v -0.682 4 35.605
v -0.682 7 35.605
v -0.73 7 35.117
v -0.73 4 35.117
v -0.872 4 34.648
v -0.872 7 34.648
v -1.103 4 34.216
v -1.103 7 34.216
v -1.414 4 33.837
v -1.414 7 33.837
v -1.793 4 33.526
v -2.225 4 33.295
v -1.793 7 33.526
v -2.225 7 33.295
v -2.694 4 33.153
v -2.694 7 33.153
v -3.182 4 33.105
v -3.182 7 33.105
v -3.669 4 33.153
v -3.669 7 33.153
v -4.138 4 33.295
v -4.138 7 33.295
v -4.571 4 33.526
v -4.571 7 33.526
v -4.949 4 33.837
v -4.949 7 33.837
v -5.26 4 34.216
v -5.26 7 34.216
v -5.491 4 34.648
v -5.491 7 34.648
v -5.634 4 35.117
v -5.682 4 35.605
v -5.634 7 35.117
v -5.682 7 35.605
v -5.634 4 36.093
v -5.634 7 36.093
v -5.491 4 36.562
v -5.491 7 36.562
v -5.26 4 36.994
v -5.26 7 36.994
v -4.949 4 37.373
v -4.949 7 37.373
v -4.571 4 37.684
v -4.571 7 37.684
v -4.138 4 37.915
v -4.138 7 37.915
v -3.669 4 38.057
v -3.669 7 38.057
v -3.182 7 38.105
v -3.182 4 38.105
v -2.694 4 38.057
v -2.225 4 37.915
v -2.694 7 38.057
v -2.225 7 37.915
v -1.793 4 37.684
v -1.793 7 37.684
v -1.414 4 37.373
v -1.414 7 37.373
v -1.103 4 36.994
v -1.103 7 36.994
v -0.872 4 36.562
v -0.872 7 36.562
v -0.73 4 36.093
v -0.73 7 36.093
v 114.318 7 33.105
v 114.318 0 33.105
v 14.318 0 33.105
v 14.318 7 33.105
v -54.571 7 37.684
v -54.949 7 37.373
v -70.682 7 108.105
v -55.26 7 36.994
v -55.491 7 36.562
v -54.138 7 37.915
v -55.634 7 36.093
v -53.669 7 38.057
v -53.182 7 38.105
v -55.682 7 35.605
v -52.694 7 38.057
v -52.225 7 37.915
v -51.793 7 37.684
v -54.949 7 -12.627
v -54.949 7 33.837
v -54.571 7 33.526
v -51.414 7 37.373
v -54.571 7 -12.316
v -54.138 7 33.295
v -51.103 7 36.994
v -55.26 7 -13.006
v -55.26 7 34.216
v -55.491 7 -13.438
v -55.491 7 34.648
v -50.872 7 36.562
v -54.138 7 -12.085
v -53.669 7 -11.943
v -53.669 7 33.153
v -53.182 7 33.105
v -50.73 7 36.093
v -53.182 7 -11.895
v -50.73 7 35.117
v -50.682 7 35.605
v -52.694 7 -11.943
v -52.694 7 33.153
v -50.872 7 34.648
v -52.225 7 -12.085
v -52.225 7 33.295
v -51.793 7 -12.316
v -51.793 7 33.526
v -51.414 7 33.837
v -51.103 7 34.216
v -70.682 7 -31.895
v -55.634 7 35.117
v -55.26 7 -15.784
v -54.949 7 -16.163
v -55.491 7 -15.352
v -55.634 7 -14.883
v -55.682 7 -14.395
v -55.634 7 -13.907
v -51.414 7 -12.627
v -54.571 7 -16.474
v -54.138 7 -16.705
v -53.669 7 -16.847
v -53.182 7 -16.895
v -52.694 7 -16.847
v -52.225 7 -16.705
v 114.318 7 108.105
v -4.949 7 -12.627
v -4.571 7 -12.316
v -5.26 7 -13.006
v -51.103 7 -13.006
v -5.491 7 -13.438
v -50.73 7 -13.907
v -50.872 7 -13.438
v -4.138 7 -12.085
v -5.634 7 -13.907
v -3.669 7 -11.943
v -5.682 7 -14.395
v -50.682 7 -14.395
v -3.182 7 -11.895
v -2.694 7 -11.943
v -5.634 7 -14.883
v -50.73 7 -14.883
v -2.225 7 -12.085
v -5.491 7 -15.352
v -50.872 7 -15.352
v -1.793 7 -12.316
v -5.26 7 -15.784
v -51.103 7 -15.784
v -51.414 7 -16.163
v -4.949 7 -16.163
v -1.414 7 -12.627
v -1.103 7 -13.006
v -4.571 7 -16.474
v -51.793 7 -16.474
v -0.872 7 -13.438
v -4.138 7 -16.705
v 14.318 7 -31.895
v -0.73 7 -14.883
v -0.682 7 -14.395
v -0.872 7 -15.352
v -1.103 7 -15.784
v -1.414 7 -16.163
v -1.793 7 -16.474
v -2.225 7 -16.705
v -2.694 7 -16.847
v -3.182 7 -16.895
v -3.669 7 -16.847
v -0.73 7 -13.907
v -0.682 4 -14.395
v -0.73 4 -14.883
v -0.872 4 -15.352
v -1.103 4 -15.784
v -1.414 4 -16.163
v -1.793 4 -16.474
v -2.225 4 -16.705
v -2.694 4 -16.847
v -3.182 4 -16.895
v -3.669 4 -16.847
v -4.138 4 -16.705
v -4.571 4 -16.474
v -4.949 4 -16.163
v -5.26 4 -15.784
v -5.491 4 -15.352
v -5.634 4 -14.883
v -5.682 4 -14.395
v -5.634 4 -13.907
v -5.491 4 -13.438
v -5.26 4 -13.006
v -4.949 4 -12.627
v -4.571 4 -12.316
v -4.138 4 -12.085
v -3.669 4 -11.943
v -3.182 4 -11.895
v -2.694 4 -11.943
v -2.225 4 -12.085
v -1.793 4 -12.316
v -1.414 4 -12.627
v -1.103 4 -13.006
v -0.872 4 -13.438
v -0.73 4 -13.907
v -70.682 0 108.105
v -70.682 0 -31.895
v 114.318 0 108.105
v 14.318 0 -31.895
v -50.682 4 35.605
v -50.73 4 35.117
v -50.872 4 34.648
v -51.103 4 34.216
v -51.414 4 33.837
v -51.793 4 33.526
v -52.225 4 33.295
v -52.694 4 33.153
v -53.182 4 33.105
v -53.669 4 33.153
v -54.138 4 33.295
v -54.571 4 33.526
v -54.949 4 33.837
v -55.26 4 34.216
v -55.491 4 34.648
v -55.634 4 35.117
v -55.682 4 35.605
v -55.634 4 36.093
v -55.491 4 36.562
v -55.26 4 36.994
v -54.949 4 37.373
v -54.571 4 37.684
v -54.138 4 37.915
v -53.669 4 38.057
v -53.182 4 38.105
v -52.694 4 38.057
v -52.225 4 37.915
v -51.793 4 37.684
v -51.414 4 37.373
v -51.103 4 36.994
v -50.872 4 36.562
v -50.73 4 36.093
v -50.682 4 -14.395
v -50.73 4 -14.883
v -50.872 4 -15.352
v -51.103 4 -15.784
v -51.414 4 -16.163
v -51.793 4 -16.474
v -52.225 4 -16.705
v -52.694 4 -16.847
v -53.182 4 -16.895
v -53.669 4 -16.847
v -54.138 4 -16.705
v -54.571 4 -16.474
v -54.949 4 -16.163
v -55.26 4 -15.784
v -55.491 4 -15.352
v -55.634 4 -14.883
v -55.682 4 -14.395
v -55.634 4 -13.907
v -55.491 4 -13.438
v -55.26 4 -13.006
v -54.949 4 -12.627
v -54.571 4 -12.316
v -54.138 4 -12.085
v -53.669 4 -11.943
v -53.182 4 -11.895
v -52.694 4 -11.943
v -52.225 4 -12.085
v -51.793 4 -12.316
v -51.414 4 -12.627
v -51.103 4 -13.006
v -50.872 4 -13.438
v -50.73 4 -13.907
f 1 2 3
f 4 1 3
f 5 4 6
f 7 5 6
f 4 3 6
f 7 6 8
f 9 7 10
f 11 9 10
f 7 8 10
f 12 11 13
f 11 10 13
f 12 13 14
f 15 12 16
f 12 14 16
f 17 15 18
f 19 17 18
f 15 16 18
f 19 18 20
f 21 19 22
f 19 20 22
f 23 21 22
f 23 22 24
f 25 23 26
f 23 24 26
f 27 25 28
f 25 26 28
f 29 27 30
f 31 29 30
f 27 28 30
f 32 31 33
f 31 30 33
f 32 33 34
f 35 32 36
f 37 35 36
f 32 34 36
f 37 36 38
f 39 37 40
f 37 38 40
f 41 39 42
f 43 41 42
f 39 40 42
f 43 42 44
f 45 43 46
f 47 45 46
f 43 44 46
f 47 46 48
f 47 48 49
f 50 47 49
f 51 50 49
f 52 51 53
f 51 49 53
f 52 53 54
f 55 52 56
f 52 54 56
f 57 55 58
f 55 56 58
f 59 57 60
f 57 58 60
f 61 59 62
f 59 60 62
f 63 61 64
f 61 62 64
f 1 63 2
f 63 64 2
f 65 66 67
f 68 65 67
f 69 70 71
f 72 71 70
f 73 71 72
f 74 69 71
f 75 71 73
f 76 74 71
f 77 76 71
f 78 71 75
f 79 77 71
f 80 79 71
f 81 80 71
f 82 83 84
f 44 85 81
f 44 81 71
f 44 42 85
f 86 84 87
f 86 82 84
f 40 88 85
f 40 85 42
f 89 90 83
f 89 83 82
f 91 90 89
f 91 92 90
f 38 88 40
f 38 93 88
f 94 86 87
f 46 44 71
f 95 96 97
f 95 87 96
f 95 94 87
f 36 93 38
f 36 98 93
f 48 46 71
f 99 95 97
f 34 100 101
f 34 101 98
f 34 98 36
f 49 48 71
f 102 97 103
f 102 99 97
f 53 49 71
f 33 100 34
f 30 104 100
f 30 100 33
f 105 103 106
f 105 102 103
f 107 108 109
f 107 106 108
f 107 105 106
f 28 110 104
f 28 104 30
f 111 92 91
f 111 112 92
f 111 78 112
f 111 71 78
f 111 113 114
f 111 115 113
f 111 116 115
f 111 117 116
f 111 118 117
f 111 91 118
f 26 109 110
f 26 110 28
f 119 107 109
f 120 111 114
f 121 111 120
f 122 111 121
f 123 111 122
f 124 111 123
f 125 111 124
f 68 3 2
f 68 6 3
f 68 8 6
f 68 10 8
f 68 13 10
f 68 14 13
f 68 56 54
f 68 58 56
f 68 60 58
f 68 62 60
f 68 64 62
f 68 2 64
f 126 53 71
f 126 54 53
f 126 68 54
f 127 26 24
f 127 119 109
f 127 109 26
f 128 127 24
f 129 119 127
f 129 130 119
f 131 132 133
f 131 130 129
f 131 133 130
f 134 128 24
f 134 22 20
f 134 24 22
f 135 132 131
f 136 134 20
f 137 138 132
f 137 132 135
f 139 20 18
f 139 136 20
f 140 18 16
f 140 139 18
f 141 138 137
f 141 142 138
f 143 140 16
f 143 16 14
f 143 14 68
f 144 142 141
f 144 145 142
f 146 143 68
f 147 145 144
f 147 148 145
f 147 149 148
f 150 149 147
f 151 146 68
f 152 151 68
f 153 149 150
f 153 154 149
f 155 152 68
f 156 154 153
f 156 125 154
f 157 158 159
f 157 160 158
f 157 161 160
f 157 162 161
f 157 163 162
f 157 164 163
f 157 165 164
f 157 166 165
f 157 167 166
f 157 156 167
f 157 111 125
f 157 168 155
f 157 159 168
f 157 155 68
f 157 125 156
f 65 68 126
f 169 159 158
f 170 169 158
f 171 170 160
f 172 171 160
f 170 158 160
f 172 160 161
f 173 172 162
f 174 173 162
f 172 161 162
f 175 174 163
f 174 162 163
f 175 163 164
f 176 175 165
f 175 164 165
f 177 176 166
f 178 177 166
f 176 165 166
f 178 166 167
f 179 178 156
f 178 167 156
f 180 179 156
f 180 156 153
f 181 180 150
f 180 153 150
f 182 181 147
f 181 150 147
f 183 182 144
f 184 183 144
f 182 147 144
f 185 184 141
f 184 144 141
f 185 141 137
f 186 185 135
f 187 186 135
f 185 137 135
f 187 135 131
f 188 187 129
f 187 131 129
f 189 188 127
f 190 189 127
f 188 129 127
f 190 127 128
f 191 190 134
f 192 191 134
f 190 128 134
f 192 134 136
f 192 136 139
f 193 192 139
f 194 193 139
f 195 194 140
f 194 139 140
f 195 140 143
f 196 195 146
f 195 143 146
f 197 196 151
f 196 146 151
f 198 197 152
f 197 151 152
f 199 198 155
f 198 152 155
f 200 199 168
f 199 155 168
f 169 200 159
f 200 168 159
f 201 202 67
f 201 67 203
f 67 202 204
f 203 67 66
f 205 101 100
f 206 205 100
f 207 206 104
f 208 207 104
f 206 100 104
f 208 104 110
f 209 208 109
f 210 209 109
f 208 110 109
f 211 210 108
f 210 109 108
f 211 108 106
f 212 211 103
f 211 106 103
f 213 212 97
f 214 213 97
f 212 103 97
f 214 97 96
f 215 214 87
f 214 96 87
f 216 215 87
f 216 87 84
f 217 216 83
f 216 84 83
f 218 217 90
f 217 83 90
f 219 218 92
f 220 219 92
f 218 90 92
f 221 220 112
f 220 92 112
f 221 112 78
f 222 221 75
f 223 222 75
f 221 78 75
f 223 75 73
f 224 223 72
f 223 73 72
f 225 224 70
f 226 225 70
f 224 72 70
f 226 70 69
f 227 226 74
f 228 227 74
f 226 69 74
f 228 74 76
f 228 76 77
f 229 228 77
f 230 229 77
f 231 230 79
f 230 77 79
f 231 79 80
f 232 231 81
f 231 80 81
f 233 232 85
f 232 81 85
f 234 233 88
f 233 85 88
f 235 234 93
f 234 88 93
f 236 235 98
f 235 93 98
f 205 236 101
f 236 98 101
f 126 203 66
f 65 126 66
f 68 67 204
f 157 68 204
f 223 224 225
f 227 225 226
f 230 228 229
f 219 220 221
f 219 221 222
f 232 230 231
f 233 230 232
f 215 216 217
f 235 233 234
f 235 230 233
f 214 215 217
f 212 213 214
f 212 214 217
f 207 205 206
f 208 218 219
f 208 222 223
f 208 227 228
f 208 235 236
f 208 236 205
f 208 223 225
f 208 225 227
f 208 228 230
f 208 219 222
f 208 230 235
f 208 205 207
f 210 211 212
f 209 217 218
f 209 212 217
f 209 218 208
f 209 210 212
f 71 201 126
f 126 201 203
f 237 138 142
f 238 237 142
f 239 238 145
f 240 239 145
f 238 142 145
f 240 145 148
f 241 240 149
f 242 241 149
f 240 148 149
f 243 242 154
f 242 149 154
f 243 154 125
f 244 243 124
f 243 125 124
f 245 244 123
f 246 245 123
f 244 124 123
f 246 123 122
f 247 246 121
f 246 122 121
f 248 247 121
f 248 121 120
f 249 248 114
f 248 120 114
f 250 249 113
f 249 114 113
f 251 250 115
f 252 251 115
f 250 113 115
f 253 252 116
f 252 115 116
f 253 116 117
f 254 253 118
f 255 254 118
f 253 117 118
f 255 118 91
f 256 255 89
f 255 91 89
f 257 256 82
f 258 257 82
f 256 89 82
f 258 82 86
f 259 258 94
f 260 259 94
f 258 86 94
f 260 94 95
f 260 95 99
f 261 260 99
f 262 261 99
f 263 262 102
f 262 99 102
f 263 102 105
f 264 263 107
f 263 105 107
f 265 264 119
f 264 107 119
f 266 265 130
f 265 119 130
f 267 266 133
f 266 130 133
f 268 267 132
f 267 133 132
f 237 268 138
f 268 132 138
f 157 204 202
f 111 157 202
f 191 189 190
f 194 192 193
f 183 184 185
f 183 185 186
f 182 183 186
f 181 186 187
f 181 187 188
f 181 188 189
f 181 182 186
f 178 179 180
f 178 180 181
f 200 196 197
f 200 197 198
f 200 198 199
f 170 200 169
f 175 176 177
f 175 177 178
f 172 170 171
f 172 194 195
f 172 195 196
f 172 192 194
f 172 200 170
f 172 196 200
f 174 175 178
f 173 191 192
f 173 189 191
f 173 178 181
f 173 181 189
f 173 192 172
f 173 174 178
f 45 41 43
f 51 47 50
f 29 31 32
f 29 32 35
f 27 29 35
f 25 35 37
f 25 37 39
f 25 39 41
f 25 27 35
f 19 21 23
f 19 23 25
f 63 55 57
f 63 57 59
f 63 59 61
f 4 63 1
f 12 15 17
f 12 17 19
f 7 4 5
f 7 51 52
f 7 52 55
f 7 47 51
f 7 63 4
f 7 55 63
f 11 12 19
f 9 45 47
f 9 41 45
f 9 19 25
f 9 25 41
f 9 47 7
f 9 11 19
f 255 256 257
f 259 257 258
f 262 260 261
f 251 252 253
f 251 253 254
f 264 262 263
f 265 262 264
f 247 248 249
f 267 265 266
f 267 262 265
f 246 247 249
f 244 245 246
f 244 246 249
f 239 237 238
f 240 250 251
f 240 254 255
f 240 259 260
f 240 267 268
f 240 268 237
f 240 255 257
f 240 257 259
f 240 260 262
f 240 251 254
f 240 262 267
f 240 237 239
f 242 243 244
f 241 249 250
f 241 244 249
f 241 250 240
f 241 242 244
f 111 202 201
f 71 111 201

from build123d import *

# Parameters (mm, degrees)
BOSS_EXTRUDE1_DEPTH = 7
SKETCH2_R           = 2.5
CUT_EXTRUDE2_DEPTH  = 3


with BuildPart() as part:
    # Sketch1 → Boss-Extrude1 (new body)
    with BuildSketch(Plane(origin=(0, 0, 0), x_dir=(1, 0, 0), z_dir=(0, 1, 0))):
        Polygon((14.318293597, 31.894904459), (-70.681706403, 31.894904459), (-70.681706403, -108.105095541), (114.318293597, -108.105095541), (114.318293597, -33.105095541), (14.318293597, -33.105095541), align=None)
    extrude(amount=BOSS_EXTRUDE1_DEPTH)

    # Sketch2 → Cut-Extrude2 (cut)
    with BuildSketch(Plane(origin=(0, 7, 0), x_dir=(1, 0, 0), z_dir=(0, 1, 0))):
        with Locations((-53.181706403, 14.394904459)):
            Circle(SKETCH2_R)
        with Locations((-3.181706403, 14.394904459)):
            Circle(SKETCH2_R)
        with Locations((-3.181706403, -35.605095541)):
            Circle(SKETCH2_R)
        with Locations((-53.181706403, -35.605095541)):
            Circle(SKETCH2_R)
    extrude(amount=-CUT_EXTRUDE2_DEPTH, mode=Mode.SUBTRACT)


solid = part.part
